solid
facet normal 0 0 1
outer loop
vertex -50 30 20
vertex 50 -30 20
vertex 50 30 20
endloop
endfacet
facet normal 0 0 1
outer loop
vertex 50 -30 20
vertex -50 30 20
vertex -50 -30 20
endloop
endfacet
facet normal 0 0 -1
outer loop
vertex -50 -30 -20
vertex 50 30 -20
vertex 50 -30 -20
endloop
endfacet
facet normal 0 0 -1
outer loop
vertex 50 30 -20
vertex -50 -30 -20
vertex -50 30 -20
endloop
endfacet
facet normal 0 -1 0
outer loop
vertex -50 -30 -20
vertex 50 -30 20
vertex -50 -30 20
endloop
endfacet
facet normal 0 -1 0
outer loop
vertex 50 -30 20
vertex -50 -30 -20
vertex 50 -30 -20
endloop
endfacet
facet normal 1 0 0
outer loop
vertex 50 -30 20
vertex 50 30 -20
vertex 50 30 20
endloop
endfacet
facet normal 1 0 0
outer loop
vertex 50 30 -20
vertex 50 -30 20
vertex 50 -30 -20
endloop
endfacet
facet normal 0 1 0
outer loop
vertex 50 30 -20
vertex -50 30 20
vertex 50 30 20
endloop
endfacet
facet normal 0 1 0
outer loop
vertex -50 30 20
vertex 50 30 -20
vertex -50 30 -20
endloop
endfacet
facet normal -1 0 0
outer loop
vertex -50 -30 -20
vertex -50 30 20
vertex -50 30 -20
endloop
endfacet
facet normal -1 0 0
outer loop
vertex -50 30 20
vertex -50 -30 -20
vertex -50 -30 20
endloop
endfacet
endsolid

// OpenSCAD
shell_x=100;
shell_y=60;
shell_z=40;

// Box
shell();

module shell() {
	cube(size=[shell_x,shell_y,shell_z], center=true);
}
